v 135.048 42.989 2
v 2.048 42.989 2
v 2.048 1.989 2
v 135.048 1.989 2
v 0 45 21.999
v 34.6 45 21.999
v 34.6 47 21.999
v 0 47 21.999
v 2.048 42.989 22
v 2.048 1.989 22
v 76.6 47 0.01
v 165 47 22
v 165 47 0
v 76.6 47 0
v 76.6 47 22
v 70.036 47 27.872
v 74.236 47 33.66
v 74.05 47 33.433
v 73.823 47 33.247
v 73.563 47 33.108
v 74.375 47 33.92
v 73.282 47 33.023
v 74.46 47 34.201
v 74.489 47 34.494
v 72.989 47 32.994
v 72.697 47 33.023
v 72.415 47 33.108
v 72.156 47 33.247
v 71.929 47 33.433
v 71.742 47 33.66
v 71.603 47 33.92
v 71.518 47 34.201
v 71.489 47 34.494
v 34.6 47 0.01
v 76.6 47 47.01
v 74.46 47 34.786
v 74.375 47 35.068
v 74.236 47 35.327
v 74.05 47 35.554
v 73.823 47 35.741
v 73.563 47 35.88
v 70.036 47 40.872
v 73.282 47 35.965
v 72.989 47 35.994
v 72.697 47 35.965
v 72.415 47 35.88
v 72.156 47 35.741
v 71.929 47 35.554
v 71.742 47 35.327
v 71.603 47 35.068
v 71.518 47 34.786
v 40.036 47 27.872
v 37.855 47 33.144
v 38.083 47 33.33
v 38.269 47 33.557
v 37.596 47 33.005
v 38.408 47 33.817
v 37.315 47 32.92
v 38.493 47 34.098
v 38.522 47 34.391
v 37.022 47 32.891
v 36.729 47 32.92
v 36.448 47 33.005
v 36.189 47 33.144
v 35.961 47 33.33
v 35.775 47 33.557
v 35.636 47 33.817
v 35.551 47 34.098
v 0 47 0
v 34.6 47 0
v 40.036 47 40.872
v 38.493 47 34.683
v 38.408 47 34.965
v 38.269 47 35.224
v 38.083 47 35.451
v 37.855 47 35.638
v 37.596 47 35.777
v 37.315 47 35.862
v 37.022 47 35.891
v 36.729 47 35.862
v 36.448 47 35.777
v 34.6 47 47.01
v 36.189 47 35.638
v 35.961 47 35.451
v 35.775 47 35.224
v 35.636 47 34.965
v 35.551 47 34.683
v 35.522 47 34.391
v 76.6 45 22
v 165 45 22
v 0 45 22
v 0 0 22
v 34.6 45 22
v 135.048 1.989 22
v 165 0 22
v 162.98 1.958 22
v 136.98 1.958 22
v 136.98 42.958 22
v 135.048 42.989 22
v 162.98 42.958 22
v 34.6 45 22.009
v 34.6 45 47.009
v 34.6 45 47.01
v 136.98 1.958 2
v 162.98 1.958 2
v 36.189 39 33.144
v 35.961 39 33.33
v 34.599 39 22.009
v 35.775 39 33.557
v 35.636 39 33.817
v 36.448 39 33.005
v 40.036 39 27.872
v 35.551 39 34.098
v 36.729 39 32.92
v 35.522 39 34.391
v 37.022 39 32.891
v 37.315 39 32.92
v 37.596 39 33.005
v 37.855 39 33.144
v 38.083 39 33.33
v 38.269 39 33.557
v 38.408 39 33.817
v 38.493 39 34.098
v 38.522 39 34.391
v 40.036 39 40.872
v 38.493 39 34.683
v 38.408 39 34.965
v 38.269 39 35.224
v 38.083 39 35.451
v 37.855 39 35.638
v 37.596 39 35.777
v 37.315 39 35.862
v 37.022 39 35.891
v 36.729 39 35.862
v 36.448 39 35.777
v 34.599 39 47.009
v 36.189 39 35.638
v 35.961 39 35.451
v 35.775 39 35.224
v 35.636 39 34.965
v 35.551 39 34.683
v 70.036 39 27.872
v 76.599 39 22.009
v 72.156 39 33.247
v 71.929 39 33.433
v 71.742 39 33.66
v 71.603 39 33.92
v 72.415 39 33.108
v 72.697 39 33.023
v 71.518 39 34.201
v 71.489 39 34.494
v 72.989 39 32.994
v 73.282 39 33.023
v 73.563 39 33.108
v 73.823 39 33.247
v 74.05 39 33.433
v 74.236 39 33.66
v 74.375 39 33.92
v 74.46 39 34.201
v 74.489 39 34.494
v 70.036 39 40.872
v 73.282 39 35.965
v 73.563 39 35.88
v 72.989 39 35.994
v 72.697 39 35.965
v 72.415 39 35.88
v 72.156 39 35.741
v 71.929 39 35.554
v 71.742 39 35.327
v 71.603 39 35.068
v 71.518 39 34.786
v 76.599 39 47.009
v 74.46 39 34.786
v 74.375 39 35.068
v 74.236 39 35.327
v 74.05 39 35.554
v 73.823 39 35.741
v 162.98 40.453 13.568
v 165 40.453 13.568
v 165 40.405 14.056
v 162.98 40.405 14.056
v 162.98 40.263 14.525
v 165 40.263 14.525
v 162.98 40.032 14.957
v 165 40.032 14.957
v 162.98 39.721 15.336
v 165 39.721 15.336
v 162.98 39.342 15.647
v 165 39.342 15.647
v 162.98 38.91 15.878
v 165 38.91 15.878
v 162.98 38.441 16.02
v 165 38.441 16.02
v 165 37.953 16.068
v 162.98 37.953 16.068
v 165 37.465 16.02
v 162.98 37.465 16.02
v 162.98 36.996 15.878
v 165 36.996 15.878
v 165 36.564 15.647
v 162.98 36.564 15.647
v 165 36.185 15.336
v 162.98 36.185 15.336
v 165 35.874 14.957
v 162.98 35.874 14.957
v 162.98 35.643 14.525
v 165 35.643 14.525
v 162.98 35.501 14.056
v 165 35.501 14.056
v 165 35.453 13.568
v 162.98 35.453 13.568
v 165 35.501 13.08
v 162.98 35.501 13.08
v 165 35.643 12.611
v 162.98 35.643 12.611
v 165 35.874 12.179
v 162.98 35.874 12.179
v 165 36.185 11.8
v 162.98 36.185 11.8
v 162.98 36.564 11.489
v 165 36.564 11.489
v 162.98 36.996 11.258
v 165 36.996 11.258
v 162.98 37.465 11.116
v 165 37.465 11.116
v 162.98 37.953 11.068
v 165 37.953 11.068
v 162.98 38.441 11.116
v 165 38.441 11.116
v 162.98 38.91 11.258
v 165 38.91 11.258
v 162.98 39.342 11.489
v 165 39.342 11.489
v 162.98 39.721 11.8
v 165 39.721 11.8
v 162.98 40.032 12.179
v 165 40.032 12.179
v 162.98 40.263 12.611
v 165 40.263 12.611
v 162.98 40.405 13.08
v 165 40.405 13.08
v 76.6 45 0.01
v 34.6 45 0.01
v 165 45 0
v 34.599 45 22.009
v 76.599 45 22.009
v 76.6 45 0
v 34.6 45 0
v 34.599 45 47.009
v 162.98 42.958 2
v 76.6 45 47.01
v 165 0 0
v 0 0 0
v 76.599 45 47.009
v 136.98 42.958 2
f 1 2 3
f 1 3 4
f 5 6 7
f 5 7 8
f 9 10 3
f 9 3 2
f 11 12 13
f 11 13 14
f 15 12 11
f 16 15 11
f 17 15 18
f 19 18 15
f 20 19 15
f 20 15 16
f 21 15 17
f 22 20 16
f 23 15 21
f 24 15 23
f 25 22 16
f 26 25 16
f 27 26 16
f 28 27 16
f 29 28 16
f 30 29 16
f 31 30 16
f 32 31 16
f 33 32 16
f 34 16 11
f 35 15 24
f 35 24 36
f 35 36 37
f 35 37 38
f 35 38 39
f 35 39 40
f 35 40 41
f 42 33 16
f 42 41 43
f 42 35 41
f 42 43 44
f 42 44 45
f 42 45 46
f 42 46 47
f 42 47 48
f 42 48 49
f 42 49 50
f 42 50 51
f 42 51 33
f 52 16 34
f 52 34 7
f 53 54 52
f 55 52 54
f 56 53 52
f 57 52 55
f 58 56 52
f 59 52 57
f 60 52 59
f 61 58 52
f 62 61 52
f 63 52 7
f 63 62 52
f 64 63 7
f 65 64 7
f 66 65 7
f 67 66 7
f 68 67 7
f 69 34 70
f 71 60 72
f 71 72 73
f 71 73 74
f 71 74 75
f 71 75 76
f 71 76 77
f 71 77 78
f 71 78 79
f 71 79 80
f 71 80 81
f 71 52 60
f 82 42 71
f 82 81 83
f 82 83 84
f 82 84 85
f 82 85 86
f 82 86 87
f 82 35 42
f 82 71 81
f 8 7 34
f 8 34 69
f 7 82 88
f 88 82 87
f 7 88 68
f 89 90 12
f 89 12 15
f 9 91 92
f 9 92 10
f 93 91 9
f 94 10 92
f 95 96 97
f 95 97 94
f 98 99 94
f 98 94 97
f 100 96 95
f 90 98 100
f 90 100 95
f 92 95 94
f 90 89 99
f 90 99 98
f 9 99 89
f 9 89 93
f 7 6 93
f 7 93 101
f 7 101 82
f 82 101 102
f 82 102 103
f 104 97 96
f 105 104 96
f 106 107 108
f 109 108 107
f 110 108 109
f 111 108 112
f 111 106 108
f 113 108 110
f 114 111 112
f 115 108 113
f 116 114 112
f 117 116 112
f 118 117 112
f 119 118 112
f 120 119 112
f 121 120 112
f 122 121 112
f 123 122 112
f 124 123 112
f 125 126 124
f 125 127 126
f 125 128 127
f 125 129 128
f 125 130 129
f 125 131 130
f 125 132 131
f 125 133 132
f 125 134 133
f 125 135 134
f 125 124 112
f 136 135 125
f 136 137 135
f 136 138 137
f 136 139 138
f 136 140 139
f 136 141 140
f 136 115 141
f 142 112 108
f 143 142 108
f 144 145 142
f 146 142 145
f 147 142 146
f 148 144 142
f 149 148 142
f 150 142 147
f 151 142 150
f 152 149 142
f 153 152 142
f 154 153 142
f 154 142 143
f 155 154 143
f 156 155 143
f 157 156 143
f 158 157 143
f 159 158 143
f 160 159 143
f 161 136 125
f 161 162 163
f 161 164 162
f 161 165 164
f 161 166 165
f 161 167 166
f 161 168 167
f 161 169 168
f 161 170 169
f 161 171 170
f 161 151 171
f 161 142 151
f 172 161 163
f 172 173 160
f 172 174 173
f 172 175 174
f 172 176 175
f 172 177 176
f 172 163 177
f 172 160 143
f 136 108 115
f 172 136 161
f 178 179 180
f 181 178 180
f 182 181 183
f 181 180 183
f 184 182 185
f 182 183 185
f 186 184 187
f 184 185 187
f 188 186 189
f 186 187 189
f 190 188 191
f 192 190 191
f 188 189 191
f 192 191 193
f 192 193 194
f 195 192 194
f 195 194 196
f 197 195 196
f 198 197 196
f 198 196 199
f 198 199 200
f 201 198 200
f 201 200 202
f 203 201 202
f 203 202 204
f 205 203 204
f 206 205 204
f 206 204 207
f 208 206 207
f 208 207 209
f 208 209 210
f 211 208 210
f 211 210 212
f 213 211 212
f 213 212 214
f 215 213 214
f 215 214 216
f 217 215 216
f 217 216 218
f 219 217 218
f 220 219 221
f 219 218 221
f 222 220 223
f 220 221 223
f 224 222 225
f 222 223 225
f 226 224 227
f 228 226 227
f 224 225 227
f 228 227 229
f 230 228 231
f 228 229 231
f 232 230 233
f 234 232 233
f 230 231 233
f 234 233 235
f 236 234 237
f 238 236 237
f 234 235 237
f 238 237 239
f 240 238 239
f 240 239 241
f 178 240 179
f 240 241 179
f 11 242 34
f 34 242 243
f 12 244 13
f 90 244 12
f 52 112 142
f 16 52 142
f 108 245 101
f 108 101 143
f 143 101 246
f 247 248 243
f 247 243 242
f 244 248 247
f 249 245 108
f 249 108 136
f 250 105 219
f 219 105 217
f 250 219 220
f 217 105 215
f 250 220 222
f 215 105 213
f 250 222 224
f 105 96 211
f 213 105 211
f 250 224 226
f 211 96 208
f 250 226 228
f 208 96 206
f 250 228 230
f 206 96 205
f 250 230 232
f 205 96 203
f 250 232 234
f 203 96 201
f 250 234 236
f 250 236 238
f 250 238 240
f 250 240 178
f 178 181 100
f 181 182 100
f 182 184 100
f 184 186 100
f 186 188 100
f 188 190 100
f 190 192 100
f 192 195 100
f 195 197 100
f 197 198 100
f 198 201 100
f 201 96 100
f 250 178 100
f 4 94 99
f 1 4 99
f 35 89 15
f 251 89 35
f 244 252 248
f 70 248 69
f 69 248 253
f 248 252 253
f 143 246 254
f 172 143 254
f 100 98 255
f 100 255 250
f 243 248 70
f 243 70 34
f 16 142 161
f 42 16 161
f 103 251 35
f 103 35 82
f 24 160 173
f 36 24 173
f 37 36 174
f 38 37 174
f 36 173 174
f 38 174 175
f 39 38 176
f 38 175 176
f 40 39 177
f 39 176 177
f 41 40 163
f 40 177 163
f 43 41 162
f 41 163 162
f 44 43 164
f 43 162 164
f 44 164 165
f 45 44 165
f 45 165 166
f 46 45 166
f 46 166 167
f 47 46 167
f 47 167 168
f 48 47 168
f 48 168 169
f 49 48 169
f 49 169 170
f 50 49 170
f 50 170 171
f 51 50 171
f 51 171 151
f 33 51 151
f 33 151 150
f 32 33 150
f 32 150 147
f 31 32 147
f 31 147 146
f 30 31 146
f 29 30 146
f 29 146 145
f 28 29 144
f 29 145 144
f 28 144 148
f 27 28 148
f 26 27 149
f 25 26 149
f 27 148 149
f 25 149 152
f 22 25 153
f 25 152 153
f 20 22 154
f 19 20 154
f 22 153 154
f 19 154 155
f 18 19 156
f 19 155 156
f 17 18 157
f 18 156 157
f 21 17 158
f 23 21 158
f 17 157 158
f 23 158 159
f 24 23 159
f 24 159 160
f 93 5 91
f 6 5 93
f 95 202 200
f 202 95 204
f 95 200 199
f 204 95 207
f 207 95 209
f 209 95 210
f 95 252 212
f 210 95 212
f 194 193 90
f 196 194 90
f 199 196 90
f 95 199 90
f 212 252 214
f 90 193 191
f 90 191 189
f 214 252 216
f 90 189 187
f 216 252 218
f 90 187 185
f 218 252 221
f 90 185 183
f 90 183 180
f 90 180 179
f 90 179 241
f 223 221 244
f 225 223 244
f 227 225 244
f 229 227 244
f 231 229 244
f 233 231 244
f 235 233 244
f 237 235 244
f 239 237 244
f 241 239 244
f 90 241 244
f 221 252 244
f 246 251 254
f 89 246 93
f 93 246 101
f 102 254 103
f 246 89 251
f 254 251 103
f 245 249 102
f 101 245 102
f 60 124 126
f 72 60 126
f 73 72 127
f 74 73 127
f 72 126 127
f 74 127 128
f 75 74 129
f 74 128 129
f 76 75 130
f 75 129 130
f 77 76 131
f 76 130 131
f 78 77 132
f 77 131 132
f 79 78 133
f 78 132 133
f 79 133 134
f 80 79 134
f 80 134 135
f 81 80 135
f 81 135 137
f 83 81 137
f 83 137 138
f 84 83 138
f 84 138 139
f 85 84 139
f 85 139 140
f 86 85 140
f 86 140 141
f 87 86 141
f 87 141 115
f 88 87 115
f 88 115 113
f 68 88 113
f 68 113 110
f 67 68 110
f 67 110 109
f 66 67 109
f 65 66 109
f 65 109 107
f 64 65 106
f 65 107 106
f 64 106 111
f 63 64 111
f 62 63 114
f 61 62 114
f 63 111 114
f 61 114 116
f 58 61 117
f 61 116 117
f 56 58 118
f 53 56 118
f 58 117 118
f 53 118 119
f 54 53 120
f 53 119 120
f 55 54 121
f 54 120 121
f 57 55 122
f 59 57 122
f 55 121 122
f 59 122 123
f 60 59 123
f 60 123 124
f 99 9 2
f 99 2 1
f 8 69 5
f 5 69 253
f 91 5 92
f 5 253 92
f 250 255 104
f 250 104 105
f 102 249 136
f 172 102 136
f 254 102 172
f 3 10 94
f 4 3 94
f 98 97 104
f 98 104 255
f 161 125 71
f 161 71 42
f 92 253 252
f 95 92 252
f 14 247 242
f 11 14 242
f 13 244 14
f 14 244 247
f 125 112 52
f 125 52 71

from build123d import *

# Parameters (mm, degrees)
SKETCH_W        = 165
SKETCH_H        = 45
PAD_DEPTH       = 22
SKETCH001_W     = 133
SKETCH001_H     = 41
POCKET_DEPTH    = 20
SKETCH002_W     = 26
SKETCH002_H     = 41
POCKET001_DEPTH = 20
SKETCH003_W     = 42
SKETCH003_H     = 47
PAD001_DEPTH    = 2
SKETCH008_W     = 42
SKETCH008_H     = 25
PAD002_DEPTH    = 6
SKETCH005_W     = 30
SKETCH005_H     = 13
POCKET002_DEPTH = 8.001
SKETCH009_R     = 1.5
POCKET003_DEPTH = 8.001
SKETCH007_R     = 2.5
POCKET004_DEPTH = 5
SKETCH011_W     = 88.399971
SKETCH011_H     = 21.999902
PAD003_DEPTH    = 2
SKETCH012_W     = 34.60038
SKETCH012_H     = 21.999496
PAD004_DEPTH    = 2


with BuildPart() as part:
    # Sketch → Pad (new body)
    with BuildSketch(Plane.XY):
        with Locations((82.5, 22.5)):
            Rectangle(SKETCH_W, SKETCH_H)
    extrude(amount=PAD_DEPTH)

    # Sketch001 (on Face6 of Pad) → Pocket (cut)
    with BuildSketch(Plane.XY.offset(22)):
        with Locations((68.54825, 22.488898)):
            Rectangle(SKETCH001_W, SKETCH001_H)
    extrude(amount=-POCKET_DEPTH, mode=Mode.SUBTRACT)

    # Sketch002 (on Face5 of Pocket) → Pocket001 (cut)
    with BuildSketch(Plane.XY.offset(22)):
        with Locations((149.979632, 22.458033)):
            Rectangle(SKETCH002_W, SKETCH002_H)
    extrude(amount=-POCKET001_DEPTH, mode=Mode.SUBTRACT)

    # Sketch003 (on Face1 of Pocket001) → Pad001 (join)
    with BuildSketch(Plane(origin=(0, 45, 0), x_dir=(-1, 0, 0), z_dir=(0, 1, 0))):
        with Locations((-55.599999, 23.509954)):
            Rectangle(SKETCH003_W, SKETCH003_H)
    extrude(amount=PAD001_DEPTH)

    # Sketch008 (on Face10 of Pad001) → Pad002 (join)
    with BuildSketch(Plane.XZ.offset(-45)):
        with Locations((55.598549, 34.508675)):
            Rectangle(SKETCH008_W, SKETCH008_H)
    extrude(amount=PAD002_DEPTH)

    # Sketch005 (on Face28 of Pad002) → Pocket002 (cut, through all)
    with BuildSketch(Plane.XZ.offset(-39)):
        with Locations((55.035654, 34.372233)):
            Rectangle(SKETCH005_W, SKETCH005_H)
    extrude(amount=-POCKET002_DEPTH, mode=Mode.SUBTRACT)

    # Sketch009 (on Face32 of Pocket002) → Pocket003 (cut, through all)
    with BuildSketch(Plane.XZ.offset(-39)):
        with Locations((37.021919, 34.390724)):
            Circle(SKETCH009_R)
        with Locations((72.989189, 34.493778)):
            Circle(SKETCH009_R)
    extrude(amount=-POCKET003_DEPTH, mode=Mode.SUBTRACT)

    # Sketch007 (on Face3 of Pocket003) → Pocket004 (cut)
    with BuildSketch(Plane.YZ.offset(165)):
        with Locations((37.952961, 13.56812)):
            Circle(SKETCH007_R)
    extrude(amount=-POCKET004_DEPTH, mode=Mode.SUBTRACT)

    # Sketch011 (on Face2 of Pocket004) → Pad003 (join)
    with BuildSketch(Plane(origin=(0, 45, 0), x_dir=(-1, 0, 0), z_dir=(0, 1, 0))):
        with Locations((-120.799969, 11.000045)):
            Rectangle(SKETCH011_W, SKETCH011_H)
    extrude(amount=PAD003_DEPTH)

    # Sketch012 (on Face2 of Pad003) → Pad004 (join)
    with BuildSketch(Plane(origin=(0, 45, 0), x_dir=(-1, 0, 0), z_dir=(0, 1, 0))):
        with Locations((-17.30019, 10.999748)):
            Rectangle(SKETCH012_W, SKETCH012_H)
    extrude(amount=PAD004_DEPTH)


solid = part.part
